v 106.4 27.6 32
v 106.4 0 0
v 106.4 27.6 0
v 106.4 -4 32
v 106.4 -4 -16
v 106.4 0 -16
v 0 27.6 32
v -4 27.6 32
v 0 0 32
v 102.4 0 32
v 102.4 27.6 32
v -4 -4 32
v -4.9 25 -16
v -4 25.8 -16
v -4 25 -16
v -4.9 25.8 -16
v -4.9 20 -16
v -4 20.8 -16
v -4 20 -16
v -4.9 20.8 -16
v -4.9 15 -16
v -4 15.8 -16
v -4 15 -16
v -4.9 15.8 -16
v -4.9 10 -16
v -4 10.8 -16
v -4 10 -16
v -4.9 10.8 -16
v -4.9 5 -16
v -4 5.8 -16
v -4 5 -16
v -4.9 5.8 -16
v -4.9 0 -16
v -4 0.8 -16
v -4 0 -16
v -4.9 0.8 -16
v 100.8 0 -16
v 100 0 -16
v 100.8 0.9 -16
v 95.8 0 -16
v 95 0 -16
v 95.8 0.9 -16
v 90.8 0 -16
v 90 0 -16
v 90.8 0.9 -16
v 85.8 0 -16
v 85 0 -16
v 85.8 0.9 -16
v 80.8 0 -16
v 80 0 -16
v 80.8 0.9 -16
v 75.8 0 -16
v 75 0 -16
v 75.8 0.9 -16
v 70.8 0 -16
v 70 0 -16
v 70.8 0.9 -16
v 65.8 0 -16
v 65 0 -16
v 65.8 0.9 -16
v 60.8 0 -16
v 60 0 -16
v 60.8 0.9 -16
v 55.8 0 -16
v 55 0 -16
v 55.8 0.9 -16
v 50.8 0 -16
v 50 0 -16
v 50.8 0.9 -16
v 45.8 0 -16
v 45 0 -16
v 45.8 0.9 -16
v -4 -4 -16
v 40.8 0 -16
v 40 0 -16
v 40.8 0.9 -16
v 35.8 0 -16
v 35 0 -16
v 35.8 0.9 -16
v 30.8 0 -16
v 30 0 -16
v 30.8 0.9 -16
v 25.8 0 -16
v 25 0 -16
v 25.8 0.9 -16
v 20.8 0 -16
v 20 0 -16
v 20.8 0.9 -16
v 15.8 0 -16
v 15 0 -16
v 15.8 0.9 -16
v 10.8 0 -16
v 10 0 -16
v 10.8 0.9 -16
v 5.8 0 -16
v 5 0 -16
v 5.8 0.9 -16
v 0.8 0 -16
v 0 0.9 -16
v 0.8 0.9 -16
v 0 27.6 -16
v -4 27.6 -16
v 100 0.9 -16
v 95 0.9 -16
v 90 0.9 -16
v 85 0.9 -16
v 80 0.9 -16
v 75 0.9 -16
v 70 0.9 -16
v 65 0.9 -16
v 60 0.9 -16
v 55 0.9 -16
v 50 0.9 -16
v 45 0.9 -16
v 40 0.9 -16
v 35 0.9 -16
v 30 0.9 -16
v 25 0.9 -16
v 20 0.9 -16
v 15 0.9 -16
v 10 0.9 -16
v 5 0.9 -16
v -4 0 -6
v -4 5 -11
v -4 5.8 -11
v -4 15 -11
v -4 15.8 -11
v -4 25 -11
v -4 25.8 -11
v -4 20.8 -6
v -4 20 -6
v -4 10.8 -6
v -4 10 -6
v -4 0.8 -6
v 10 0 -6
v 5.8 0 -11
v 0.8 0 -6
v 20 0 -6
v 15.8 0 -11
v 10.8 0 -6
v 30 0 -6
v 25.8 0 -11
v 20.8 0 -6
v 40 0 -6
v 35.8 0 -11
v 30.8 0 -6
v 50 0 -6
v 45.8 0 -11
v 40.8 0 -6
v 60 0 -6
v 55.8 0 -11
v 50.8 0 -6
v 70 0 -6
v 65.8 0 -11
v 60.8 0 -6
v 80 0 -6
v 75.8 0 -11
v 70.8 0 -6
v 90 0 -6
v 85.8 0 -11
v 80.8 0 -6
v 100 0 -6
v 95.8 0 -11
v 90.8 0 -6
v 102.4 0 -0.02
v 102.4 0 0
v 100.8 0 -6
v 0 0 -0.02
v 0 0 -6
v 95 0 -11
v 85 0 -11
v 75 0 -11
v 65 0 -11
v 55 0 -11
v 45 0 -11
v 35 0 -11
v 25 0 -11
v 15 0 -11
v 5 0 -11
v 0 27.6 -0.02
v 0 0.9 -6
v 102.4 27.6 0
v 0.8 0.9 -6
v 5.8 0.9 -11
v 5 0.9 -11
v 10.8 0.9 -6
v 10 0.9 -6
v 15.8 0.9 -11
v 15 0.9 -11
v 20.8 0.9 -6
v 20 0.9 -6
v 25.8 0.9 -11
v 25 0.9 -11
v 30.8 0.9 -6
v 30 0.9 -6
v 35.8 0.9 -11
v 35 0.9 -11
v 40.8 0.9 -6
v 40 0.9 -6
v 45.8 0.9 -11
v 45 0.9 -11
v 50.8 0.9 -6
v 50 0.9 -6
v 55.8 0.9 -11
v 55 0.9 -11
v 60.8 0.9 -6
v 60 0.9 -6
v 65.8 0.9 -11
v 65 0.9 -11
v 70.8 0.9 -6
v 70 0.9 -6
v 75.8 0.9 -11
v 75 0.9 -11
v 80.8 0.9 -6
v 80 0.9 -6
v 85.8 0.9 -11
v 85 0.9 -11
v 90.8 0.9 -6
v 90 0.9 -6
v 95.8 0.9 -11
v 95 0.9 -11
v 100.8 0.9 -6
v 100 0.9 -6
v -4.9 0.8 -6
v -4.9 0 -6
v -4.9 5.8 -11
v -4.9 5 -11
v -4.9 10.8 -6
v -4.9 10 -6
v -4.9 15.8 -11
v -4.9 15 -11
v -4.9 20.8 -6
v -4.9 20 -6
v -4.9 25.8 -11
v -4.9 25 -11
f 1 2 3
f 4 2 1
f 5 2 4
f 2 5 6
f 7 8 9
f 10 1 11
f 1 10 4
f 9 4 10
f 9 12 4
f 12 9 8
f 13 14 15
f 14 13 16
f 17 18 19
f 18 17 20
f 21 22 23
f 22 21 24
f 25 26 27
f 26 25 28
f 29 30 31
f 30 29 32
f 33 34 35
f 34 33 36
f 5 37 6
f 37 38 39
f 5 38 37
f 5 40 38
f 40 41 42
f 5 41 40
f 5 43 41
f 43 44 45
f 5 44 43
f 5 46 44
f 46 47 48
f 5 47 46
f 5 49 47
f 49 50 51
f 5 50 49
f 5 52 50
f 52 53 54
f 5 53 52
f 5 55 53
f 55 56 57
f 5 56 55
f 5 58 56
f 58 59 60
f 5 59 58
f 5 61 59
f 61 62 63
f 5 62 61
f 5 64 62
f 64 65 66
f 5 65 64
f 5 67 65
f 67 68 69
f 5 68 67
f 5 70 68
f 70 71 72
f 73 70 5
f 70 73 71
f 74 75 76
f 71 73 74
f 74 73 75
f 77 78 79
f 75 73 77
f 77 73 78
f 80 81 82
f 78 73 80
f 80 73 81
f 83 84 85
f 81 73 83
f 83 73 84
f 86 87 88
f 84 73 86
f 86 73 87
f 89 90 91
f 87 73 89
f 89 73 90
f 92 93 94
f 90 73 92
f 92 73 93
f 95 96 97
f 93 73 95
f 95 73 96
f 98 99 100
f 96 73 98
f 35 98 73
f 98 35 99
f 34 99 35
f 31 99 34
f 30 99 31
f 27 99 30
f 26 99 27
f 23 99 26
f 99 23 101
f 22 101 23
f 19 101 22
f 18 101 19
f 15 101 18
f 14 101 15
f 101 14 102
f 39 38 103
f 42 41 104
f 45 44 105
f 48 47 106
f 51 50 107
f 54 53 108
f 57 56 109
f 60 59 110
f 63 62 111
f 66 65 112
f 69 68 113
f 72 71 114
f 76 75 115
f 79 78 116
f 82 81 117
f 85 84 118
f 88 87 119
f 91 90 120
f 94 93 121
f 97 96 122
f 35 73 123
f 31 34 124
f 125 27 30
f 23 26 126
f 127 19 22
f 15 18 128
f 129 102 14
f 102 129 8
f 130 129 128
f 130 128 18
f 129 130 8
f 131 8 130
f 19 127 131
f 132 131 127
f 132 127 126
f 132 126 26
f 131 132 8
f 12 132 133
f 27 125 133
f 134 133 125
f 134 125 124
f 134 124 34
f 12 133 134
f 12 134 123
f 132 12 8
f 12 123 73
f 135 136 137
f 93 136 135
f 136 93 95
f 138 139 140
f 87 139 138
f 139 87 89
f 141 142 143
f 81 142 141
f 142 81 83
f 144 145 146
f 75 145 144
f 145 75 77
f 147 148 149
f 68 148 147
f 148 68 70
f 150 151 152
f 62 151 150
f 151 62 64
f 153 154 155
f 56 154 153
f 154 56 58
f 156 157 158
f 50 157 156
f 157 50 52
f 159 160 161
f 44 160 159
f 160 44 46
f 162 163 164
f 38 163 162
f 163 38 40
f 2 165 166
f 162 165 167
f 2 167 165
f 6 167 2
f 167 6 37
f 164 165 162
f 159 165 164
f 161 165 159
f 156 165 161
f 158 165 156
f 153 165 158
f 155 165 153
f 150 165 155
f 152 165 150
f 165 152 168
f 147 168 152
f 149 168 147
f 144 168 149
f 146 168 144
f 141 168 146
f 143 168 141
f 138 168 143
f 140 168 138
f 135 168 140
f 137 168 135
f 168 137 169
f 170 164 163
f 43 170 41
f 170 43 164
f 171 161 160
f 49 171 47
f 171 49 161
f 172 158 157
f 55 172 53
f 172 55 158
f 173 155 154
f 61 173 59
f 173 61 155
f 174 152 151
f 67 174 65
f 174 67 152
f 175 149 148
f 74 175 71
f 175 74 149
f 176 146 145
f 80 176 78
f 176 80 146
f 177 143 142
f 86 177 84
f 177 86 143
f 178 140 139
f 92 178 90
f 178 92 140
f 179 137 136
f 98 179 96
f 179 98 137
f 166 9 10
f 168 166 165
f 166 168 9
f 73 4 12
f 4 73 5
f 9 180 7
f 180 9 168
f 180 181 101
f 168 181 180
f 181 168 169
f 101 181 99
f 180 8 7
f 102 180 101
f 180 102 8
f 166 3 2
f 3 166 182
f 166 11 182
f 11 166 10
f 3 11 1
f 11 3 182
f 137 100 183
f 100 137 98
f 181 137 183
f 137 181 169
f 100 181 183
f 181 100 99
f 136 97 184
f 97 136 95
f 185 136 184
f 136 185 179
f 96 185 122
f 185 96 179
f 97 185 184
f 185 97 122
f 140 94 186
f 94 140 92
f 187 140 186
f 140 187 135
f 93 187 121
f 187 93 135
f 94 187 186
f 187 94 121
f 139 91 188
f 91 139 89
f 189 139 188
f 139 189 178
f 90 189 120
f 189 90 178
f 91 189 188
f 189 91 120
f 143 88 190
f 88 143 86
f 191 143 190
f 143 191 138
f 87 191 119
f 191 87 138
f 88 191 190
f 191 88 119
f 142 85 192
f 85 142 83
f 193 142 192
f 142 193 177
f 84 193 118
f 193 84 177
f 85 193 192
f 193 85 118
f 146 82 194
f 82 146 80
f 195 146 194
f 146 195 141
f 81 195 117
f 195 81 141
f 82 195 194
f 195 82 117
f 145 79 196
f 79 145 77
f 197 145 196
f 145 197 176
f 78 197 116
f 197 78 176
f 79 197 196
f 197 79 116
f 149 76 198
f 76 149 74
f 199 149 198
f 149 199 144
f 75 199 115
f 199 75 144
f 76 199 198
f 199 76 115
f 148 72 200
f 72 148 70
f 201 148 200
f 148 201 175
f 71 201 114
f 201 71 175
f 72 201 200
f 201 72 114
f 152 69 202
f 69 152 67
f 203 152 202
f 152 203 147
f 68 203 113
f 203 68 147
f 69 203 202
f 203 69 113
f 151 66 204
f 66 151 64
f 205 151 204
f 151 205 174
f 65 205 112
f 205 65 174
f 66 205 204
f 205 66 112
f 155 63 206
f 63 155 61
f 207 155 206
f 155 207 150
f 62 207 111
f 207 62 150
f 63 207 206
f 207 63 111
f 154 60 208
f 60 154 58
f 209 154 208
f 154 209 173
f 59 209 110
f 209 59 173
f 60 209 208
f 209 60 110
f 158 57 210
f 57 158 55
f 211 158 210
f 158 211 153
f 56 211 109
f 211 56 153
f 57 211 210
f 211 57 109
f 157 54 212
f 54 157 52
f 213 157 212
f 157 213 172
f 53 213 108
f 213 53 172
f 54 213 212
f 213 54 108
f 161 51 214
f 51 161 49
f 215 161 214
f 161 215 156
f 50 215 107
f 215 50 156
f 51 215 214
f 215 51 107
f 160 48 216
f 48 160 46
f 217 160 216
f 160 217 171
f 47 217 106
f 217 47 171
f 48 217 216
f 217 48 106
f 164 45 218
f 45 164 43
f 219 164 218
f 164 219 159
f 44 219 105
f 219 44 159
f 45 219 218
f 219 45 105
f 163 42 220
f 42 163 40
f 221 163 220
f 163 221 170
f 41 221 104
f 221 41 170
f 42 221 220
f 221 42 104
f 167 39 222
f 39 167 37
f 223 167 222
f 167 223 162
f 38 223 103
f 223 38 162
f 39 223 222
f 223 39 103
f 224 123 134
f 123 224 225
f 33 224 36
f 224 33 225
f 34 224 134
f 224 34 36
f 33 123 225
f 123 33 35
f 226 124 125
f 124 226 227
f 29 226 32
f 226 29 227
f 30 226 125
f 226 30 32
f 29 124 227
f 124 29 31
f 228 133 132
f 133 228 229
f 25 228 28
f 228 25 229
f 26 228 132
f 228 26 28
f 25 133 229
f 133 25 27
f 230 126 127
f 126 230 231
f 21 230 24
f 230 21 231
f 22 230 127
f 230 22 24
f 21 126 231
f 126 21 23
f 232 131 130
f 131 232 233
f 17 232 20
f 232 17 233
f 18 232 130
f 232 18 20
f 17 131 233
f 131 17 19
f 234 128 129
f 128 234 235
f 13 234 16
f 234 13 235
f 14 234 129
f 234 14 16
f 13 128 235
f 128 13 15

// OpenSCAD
// file: params.scad
// Общие размеры первой итерации: один отсек 3.5" и детали вокруг него.
// Корпус диска — SFF-8301, таблица 3-1, класс высоты 26.10 мм (максимум).
// Положение разъёма SATA сюда не зашито: его снимают калибром gauge.scad
// с конкретного диска и только потом переносят в окно салазок.

drive_width = 101.60;
drive_height = 26.10;
drive_length = 147.00;

wall = 4.0;
floor_t = 4.0;
lip_t = 3.0;
nib = 4.0;
side_clearance = 0.8;
top_clearance = 1.5;

front_gap = 3.0;
plate_t = 8.0;
front_extra = front_gap + plate_t;

pusher_d = 4.4;
m3_clear = 3.4;
m3_pilot = 2.6;
m3_nut_af = 5.5;
m3_nut_t = 2.8;

cavity_w = drive_width + side_clearance;
outer_w = cavity_w + 2 * wall;
wall_h = drive_height + top_clearance;
body_z = drive_length + front_extra;

strap_z = 18;
strap_t = 4.0;
strap_foot = 14.0;

plate_screw_x = [14, drive_width - 14];
plate_z0 = drive_length + front_gap;
plate_screw_z = plate_z0 + plate_t / 2;
plate_bar_h = 10;
tower_w = 28;
tower_x = drive_width / 2 - tower_w / 2;

sled_w = 78;
sled_h = 48;
sled_t = 8;
sled_window_w = 50;
sled_window_h = 18;
sled_hole_inset = 6;

$fn = 32;
// main file
// Короткий ложемент-калибр. Диск кладётся к борту X=0 и на пол Y=0,
// задней плоскостью к Z=0. Линейки торчат назад, к наблюдателю.
// Длинная риска каждые 10 мм, короткая каждые 5. Ноль — угол пола и борта.
// Это измерение, а не посадочный размер разъёма.

include <params.scad>

gauge_len = 32;
ruler = 16;
tick = 0.9;

module x_ticks() {
    for (i = [0:5:100]) {
        translate([i, -0.2, -ruler])
            cube([0.8, tick + 0.2, (i % 10) == 0 ? 10 : 5]);
    }
}

module y_ticks() {
    for (i = [0:5:25]) {
        translate([-wall - tick, i, -ruler])
            cube([tick + 0.2, 0.8, (i % 10) == 0 ? 10 : 5]);
    }
}

module gauge() {
    union() {
        difference() {
            union() {
                translate([-wall, -floor_t, -ruler])
                    cube([outer_w, floor_t, ruler + gauge_len]);
                translate([-wall, -floor_t, -ruler])
                    cube([wall, floor_t + wall_h, ruler + gauge_len]);
                translate([cavity_w, -floor_t, 0])
                    cube([wall, floor_t + wall_h, gauge_len]);
            }
            translate([0, 0, -0.02])
                cube([cavity_w, wall_h + 1, gauge_len + 0.04]);
        }
        x_ticks();
        y_ticks();
    }
}

gauge();
